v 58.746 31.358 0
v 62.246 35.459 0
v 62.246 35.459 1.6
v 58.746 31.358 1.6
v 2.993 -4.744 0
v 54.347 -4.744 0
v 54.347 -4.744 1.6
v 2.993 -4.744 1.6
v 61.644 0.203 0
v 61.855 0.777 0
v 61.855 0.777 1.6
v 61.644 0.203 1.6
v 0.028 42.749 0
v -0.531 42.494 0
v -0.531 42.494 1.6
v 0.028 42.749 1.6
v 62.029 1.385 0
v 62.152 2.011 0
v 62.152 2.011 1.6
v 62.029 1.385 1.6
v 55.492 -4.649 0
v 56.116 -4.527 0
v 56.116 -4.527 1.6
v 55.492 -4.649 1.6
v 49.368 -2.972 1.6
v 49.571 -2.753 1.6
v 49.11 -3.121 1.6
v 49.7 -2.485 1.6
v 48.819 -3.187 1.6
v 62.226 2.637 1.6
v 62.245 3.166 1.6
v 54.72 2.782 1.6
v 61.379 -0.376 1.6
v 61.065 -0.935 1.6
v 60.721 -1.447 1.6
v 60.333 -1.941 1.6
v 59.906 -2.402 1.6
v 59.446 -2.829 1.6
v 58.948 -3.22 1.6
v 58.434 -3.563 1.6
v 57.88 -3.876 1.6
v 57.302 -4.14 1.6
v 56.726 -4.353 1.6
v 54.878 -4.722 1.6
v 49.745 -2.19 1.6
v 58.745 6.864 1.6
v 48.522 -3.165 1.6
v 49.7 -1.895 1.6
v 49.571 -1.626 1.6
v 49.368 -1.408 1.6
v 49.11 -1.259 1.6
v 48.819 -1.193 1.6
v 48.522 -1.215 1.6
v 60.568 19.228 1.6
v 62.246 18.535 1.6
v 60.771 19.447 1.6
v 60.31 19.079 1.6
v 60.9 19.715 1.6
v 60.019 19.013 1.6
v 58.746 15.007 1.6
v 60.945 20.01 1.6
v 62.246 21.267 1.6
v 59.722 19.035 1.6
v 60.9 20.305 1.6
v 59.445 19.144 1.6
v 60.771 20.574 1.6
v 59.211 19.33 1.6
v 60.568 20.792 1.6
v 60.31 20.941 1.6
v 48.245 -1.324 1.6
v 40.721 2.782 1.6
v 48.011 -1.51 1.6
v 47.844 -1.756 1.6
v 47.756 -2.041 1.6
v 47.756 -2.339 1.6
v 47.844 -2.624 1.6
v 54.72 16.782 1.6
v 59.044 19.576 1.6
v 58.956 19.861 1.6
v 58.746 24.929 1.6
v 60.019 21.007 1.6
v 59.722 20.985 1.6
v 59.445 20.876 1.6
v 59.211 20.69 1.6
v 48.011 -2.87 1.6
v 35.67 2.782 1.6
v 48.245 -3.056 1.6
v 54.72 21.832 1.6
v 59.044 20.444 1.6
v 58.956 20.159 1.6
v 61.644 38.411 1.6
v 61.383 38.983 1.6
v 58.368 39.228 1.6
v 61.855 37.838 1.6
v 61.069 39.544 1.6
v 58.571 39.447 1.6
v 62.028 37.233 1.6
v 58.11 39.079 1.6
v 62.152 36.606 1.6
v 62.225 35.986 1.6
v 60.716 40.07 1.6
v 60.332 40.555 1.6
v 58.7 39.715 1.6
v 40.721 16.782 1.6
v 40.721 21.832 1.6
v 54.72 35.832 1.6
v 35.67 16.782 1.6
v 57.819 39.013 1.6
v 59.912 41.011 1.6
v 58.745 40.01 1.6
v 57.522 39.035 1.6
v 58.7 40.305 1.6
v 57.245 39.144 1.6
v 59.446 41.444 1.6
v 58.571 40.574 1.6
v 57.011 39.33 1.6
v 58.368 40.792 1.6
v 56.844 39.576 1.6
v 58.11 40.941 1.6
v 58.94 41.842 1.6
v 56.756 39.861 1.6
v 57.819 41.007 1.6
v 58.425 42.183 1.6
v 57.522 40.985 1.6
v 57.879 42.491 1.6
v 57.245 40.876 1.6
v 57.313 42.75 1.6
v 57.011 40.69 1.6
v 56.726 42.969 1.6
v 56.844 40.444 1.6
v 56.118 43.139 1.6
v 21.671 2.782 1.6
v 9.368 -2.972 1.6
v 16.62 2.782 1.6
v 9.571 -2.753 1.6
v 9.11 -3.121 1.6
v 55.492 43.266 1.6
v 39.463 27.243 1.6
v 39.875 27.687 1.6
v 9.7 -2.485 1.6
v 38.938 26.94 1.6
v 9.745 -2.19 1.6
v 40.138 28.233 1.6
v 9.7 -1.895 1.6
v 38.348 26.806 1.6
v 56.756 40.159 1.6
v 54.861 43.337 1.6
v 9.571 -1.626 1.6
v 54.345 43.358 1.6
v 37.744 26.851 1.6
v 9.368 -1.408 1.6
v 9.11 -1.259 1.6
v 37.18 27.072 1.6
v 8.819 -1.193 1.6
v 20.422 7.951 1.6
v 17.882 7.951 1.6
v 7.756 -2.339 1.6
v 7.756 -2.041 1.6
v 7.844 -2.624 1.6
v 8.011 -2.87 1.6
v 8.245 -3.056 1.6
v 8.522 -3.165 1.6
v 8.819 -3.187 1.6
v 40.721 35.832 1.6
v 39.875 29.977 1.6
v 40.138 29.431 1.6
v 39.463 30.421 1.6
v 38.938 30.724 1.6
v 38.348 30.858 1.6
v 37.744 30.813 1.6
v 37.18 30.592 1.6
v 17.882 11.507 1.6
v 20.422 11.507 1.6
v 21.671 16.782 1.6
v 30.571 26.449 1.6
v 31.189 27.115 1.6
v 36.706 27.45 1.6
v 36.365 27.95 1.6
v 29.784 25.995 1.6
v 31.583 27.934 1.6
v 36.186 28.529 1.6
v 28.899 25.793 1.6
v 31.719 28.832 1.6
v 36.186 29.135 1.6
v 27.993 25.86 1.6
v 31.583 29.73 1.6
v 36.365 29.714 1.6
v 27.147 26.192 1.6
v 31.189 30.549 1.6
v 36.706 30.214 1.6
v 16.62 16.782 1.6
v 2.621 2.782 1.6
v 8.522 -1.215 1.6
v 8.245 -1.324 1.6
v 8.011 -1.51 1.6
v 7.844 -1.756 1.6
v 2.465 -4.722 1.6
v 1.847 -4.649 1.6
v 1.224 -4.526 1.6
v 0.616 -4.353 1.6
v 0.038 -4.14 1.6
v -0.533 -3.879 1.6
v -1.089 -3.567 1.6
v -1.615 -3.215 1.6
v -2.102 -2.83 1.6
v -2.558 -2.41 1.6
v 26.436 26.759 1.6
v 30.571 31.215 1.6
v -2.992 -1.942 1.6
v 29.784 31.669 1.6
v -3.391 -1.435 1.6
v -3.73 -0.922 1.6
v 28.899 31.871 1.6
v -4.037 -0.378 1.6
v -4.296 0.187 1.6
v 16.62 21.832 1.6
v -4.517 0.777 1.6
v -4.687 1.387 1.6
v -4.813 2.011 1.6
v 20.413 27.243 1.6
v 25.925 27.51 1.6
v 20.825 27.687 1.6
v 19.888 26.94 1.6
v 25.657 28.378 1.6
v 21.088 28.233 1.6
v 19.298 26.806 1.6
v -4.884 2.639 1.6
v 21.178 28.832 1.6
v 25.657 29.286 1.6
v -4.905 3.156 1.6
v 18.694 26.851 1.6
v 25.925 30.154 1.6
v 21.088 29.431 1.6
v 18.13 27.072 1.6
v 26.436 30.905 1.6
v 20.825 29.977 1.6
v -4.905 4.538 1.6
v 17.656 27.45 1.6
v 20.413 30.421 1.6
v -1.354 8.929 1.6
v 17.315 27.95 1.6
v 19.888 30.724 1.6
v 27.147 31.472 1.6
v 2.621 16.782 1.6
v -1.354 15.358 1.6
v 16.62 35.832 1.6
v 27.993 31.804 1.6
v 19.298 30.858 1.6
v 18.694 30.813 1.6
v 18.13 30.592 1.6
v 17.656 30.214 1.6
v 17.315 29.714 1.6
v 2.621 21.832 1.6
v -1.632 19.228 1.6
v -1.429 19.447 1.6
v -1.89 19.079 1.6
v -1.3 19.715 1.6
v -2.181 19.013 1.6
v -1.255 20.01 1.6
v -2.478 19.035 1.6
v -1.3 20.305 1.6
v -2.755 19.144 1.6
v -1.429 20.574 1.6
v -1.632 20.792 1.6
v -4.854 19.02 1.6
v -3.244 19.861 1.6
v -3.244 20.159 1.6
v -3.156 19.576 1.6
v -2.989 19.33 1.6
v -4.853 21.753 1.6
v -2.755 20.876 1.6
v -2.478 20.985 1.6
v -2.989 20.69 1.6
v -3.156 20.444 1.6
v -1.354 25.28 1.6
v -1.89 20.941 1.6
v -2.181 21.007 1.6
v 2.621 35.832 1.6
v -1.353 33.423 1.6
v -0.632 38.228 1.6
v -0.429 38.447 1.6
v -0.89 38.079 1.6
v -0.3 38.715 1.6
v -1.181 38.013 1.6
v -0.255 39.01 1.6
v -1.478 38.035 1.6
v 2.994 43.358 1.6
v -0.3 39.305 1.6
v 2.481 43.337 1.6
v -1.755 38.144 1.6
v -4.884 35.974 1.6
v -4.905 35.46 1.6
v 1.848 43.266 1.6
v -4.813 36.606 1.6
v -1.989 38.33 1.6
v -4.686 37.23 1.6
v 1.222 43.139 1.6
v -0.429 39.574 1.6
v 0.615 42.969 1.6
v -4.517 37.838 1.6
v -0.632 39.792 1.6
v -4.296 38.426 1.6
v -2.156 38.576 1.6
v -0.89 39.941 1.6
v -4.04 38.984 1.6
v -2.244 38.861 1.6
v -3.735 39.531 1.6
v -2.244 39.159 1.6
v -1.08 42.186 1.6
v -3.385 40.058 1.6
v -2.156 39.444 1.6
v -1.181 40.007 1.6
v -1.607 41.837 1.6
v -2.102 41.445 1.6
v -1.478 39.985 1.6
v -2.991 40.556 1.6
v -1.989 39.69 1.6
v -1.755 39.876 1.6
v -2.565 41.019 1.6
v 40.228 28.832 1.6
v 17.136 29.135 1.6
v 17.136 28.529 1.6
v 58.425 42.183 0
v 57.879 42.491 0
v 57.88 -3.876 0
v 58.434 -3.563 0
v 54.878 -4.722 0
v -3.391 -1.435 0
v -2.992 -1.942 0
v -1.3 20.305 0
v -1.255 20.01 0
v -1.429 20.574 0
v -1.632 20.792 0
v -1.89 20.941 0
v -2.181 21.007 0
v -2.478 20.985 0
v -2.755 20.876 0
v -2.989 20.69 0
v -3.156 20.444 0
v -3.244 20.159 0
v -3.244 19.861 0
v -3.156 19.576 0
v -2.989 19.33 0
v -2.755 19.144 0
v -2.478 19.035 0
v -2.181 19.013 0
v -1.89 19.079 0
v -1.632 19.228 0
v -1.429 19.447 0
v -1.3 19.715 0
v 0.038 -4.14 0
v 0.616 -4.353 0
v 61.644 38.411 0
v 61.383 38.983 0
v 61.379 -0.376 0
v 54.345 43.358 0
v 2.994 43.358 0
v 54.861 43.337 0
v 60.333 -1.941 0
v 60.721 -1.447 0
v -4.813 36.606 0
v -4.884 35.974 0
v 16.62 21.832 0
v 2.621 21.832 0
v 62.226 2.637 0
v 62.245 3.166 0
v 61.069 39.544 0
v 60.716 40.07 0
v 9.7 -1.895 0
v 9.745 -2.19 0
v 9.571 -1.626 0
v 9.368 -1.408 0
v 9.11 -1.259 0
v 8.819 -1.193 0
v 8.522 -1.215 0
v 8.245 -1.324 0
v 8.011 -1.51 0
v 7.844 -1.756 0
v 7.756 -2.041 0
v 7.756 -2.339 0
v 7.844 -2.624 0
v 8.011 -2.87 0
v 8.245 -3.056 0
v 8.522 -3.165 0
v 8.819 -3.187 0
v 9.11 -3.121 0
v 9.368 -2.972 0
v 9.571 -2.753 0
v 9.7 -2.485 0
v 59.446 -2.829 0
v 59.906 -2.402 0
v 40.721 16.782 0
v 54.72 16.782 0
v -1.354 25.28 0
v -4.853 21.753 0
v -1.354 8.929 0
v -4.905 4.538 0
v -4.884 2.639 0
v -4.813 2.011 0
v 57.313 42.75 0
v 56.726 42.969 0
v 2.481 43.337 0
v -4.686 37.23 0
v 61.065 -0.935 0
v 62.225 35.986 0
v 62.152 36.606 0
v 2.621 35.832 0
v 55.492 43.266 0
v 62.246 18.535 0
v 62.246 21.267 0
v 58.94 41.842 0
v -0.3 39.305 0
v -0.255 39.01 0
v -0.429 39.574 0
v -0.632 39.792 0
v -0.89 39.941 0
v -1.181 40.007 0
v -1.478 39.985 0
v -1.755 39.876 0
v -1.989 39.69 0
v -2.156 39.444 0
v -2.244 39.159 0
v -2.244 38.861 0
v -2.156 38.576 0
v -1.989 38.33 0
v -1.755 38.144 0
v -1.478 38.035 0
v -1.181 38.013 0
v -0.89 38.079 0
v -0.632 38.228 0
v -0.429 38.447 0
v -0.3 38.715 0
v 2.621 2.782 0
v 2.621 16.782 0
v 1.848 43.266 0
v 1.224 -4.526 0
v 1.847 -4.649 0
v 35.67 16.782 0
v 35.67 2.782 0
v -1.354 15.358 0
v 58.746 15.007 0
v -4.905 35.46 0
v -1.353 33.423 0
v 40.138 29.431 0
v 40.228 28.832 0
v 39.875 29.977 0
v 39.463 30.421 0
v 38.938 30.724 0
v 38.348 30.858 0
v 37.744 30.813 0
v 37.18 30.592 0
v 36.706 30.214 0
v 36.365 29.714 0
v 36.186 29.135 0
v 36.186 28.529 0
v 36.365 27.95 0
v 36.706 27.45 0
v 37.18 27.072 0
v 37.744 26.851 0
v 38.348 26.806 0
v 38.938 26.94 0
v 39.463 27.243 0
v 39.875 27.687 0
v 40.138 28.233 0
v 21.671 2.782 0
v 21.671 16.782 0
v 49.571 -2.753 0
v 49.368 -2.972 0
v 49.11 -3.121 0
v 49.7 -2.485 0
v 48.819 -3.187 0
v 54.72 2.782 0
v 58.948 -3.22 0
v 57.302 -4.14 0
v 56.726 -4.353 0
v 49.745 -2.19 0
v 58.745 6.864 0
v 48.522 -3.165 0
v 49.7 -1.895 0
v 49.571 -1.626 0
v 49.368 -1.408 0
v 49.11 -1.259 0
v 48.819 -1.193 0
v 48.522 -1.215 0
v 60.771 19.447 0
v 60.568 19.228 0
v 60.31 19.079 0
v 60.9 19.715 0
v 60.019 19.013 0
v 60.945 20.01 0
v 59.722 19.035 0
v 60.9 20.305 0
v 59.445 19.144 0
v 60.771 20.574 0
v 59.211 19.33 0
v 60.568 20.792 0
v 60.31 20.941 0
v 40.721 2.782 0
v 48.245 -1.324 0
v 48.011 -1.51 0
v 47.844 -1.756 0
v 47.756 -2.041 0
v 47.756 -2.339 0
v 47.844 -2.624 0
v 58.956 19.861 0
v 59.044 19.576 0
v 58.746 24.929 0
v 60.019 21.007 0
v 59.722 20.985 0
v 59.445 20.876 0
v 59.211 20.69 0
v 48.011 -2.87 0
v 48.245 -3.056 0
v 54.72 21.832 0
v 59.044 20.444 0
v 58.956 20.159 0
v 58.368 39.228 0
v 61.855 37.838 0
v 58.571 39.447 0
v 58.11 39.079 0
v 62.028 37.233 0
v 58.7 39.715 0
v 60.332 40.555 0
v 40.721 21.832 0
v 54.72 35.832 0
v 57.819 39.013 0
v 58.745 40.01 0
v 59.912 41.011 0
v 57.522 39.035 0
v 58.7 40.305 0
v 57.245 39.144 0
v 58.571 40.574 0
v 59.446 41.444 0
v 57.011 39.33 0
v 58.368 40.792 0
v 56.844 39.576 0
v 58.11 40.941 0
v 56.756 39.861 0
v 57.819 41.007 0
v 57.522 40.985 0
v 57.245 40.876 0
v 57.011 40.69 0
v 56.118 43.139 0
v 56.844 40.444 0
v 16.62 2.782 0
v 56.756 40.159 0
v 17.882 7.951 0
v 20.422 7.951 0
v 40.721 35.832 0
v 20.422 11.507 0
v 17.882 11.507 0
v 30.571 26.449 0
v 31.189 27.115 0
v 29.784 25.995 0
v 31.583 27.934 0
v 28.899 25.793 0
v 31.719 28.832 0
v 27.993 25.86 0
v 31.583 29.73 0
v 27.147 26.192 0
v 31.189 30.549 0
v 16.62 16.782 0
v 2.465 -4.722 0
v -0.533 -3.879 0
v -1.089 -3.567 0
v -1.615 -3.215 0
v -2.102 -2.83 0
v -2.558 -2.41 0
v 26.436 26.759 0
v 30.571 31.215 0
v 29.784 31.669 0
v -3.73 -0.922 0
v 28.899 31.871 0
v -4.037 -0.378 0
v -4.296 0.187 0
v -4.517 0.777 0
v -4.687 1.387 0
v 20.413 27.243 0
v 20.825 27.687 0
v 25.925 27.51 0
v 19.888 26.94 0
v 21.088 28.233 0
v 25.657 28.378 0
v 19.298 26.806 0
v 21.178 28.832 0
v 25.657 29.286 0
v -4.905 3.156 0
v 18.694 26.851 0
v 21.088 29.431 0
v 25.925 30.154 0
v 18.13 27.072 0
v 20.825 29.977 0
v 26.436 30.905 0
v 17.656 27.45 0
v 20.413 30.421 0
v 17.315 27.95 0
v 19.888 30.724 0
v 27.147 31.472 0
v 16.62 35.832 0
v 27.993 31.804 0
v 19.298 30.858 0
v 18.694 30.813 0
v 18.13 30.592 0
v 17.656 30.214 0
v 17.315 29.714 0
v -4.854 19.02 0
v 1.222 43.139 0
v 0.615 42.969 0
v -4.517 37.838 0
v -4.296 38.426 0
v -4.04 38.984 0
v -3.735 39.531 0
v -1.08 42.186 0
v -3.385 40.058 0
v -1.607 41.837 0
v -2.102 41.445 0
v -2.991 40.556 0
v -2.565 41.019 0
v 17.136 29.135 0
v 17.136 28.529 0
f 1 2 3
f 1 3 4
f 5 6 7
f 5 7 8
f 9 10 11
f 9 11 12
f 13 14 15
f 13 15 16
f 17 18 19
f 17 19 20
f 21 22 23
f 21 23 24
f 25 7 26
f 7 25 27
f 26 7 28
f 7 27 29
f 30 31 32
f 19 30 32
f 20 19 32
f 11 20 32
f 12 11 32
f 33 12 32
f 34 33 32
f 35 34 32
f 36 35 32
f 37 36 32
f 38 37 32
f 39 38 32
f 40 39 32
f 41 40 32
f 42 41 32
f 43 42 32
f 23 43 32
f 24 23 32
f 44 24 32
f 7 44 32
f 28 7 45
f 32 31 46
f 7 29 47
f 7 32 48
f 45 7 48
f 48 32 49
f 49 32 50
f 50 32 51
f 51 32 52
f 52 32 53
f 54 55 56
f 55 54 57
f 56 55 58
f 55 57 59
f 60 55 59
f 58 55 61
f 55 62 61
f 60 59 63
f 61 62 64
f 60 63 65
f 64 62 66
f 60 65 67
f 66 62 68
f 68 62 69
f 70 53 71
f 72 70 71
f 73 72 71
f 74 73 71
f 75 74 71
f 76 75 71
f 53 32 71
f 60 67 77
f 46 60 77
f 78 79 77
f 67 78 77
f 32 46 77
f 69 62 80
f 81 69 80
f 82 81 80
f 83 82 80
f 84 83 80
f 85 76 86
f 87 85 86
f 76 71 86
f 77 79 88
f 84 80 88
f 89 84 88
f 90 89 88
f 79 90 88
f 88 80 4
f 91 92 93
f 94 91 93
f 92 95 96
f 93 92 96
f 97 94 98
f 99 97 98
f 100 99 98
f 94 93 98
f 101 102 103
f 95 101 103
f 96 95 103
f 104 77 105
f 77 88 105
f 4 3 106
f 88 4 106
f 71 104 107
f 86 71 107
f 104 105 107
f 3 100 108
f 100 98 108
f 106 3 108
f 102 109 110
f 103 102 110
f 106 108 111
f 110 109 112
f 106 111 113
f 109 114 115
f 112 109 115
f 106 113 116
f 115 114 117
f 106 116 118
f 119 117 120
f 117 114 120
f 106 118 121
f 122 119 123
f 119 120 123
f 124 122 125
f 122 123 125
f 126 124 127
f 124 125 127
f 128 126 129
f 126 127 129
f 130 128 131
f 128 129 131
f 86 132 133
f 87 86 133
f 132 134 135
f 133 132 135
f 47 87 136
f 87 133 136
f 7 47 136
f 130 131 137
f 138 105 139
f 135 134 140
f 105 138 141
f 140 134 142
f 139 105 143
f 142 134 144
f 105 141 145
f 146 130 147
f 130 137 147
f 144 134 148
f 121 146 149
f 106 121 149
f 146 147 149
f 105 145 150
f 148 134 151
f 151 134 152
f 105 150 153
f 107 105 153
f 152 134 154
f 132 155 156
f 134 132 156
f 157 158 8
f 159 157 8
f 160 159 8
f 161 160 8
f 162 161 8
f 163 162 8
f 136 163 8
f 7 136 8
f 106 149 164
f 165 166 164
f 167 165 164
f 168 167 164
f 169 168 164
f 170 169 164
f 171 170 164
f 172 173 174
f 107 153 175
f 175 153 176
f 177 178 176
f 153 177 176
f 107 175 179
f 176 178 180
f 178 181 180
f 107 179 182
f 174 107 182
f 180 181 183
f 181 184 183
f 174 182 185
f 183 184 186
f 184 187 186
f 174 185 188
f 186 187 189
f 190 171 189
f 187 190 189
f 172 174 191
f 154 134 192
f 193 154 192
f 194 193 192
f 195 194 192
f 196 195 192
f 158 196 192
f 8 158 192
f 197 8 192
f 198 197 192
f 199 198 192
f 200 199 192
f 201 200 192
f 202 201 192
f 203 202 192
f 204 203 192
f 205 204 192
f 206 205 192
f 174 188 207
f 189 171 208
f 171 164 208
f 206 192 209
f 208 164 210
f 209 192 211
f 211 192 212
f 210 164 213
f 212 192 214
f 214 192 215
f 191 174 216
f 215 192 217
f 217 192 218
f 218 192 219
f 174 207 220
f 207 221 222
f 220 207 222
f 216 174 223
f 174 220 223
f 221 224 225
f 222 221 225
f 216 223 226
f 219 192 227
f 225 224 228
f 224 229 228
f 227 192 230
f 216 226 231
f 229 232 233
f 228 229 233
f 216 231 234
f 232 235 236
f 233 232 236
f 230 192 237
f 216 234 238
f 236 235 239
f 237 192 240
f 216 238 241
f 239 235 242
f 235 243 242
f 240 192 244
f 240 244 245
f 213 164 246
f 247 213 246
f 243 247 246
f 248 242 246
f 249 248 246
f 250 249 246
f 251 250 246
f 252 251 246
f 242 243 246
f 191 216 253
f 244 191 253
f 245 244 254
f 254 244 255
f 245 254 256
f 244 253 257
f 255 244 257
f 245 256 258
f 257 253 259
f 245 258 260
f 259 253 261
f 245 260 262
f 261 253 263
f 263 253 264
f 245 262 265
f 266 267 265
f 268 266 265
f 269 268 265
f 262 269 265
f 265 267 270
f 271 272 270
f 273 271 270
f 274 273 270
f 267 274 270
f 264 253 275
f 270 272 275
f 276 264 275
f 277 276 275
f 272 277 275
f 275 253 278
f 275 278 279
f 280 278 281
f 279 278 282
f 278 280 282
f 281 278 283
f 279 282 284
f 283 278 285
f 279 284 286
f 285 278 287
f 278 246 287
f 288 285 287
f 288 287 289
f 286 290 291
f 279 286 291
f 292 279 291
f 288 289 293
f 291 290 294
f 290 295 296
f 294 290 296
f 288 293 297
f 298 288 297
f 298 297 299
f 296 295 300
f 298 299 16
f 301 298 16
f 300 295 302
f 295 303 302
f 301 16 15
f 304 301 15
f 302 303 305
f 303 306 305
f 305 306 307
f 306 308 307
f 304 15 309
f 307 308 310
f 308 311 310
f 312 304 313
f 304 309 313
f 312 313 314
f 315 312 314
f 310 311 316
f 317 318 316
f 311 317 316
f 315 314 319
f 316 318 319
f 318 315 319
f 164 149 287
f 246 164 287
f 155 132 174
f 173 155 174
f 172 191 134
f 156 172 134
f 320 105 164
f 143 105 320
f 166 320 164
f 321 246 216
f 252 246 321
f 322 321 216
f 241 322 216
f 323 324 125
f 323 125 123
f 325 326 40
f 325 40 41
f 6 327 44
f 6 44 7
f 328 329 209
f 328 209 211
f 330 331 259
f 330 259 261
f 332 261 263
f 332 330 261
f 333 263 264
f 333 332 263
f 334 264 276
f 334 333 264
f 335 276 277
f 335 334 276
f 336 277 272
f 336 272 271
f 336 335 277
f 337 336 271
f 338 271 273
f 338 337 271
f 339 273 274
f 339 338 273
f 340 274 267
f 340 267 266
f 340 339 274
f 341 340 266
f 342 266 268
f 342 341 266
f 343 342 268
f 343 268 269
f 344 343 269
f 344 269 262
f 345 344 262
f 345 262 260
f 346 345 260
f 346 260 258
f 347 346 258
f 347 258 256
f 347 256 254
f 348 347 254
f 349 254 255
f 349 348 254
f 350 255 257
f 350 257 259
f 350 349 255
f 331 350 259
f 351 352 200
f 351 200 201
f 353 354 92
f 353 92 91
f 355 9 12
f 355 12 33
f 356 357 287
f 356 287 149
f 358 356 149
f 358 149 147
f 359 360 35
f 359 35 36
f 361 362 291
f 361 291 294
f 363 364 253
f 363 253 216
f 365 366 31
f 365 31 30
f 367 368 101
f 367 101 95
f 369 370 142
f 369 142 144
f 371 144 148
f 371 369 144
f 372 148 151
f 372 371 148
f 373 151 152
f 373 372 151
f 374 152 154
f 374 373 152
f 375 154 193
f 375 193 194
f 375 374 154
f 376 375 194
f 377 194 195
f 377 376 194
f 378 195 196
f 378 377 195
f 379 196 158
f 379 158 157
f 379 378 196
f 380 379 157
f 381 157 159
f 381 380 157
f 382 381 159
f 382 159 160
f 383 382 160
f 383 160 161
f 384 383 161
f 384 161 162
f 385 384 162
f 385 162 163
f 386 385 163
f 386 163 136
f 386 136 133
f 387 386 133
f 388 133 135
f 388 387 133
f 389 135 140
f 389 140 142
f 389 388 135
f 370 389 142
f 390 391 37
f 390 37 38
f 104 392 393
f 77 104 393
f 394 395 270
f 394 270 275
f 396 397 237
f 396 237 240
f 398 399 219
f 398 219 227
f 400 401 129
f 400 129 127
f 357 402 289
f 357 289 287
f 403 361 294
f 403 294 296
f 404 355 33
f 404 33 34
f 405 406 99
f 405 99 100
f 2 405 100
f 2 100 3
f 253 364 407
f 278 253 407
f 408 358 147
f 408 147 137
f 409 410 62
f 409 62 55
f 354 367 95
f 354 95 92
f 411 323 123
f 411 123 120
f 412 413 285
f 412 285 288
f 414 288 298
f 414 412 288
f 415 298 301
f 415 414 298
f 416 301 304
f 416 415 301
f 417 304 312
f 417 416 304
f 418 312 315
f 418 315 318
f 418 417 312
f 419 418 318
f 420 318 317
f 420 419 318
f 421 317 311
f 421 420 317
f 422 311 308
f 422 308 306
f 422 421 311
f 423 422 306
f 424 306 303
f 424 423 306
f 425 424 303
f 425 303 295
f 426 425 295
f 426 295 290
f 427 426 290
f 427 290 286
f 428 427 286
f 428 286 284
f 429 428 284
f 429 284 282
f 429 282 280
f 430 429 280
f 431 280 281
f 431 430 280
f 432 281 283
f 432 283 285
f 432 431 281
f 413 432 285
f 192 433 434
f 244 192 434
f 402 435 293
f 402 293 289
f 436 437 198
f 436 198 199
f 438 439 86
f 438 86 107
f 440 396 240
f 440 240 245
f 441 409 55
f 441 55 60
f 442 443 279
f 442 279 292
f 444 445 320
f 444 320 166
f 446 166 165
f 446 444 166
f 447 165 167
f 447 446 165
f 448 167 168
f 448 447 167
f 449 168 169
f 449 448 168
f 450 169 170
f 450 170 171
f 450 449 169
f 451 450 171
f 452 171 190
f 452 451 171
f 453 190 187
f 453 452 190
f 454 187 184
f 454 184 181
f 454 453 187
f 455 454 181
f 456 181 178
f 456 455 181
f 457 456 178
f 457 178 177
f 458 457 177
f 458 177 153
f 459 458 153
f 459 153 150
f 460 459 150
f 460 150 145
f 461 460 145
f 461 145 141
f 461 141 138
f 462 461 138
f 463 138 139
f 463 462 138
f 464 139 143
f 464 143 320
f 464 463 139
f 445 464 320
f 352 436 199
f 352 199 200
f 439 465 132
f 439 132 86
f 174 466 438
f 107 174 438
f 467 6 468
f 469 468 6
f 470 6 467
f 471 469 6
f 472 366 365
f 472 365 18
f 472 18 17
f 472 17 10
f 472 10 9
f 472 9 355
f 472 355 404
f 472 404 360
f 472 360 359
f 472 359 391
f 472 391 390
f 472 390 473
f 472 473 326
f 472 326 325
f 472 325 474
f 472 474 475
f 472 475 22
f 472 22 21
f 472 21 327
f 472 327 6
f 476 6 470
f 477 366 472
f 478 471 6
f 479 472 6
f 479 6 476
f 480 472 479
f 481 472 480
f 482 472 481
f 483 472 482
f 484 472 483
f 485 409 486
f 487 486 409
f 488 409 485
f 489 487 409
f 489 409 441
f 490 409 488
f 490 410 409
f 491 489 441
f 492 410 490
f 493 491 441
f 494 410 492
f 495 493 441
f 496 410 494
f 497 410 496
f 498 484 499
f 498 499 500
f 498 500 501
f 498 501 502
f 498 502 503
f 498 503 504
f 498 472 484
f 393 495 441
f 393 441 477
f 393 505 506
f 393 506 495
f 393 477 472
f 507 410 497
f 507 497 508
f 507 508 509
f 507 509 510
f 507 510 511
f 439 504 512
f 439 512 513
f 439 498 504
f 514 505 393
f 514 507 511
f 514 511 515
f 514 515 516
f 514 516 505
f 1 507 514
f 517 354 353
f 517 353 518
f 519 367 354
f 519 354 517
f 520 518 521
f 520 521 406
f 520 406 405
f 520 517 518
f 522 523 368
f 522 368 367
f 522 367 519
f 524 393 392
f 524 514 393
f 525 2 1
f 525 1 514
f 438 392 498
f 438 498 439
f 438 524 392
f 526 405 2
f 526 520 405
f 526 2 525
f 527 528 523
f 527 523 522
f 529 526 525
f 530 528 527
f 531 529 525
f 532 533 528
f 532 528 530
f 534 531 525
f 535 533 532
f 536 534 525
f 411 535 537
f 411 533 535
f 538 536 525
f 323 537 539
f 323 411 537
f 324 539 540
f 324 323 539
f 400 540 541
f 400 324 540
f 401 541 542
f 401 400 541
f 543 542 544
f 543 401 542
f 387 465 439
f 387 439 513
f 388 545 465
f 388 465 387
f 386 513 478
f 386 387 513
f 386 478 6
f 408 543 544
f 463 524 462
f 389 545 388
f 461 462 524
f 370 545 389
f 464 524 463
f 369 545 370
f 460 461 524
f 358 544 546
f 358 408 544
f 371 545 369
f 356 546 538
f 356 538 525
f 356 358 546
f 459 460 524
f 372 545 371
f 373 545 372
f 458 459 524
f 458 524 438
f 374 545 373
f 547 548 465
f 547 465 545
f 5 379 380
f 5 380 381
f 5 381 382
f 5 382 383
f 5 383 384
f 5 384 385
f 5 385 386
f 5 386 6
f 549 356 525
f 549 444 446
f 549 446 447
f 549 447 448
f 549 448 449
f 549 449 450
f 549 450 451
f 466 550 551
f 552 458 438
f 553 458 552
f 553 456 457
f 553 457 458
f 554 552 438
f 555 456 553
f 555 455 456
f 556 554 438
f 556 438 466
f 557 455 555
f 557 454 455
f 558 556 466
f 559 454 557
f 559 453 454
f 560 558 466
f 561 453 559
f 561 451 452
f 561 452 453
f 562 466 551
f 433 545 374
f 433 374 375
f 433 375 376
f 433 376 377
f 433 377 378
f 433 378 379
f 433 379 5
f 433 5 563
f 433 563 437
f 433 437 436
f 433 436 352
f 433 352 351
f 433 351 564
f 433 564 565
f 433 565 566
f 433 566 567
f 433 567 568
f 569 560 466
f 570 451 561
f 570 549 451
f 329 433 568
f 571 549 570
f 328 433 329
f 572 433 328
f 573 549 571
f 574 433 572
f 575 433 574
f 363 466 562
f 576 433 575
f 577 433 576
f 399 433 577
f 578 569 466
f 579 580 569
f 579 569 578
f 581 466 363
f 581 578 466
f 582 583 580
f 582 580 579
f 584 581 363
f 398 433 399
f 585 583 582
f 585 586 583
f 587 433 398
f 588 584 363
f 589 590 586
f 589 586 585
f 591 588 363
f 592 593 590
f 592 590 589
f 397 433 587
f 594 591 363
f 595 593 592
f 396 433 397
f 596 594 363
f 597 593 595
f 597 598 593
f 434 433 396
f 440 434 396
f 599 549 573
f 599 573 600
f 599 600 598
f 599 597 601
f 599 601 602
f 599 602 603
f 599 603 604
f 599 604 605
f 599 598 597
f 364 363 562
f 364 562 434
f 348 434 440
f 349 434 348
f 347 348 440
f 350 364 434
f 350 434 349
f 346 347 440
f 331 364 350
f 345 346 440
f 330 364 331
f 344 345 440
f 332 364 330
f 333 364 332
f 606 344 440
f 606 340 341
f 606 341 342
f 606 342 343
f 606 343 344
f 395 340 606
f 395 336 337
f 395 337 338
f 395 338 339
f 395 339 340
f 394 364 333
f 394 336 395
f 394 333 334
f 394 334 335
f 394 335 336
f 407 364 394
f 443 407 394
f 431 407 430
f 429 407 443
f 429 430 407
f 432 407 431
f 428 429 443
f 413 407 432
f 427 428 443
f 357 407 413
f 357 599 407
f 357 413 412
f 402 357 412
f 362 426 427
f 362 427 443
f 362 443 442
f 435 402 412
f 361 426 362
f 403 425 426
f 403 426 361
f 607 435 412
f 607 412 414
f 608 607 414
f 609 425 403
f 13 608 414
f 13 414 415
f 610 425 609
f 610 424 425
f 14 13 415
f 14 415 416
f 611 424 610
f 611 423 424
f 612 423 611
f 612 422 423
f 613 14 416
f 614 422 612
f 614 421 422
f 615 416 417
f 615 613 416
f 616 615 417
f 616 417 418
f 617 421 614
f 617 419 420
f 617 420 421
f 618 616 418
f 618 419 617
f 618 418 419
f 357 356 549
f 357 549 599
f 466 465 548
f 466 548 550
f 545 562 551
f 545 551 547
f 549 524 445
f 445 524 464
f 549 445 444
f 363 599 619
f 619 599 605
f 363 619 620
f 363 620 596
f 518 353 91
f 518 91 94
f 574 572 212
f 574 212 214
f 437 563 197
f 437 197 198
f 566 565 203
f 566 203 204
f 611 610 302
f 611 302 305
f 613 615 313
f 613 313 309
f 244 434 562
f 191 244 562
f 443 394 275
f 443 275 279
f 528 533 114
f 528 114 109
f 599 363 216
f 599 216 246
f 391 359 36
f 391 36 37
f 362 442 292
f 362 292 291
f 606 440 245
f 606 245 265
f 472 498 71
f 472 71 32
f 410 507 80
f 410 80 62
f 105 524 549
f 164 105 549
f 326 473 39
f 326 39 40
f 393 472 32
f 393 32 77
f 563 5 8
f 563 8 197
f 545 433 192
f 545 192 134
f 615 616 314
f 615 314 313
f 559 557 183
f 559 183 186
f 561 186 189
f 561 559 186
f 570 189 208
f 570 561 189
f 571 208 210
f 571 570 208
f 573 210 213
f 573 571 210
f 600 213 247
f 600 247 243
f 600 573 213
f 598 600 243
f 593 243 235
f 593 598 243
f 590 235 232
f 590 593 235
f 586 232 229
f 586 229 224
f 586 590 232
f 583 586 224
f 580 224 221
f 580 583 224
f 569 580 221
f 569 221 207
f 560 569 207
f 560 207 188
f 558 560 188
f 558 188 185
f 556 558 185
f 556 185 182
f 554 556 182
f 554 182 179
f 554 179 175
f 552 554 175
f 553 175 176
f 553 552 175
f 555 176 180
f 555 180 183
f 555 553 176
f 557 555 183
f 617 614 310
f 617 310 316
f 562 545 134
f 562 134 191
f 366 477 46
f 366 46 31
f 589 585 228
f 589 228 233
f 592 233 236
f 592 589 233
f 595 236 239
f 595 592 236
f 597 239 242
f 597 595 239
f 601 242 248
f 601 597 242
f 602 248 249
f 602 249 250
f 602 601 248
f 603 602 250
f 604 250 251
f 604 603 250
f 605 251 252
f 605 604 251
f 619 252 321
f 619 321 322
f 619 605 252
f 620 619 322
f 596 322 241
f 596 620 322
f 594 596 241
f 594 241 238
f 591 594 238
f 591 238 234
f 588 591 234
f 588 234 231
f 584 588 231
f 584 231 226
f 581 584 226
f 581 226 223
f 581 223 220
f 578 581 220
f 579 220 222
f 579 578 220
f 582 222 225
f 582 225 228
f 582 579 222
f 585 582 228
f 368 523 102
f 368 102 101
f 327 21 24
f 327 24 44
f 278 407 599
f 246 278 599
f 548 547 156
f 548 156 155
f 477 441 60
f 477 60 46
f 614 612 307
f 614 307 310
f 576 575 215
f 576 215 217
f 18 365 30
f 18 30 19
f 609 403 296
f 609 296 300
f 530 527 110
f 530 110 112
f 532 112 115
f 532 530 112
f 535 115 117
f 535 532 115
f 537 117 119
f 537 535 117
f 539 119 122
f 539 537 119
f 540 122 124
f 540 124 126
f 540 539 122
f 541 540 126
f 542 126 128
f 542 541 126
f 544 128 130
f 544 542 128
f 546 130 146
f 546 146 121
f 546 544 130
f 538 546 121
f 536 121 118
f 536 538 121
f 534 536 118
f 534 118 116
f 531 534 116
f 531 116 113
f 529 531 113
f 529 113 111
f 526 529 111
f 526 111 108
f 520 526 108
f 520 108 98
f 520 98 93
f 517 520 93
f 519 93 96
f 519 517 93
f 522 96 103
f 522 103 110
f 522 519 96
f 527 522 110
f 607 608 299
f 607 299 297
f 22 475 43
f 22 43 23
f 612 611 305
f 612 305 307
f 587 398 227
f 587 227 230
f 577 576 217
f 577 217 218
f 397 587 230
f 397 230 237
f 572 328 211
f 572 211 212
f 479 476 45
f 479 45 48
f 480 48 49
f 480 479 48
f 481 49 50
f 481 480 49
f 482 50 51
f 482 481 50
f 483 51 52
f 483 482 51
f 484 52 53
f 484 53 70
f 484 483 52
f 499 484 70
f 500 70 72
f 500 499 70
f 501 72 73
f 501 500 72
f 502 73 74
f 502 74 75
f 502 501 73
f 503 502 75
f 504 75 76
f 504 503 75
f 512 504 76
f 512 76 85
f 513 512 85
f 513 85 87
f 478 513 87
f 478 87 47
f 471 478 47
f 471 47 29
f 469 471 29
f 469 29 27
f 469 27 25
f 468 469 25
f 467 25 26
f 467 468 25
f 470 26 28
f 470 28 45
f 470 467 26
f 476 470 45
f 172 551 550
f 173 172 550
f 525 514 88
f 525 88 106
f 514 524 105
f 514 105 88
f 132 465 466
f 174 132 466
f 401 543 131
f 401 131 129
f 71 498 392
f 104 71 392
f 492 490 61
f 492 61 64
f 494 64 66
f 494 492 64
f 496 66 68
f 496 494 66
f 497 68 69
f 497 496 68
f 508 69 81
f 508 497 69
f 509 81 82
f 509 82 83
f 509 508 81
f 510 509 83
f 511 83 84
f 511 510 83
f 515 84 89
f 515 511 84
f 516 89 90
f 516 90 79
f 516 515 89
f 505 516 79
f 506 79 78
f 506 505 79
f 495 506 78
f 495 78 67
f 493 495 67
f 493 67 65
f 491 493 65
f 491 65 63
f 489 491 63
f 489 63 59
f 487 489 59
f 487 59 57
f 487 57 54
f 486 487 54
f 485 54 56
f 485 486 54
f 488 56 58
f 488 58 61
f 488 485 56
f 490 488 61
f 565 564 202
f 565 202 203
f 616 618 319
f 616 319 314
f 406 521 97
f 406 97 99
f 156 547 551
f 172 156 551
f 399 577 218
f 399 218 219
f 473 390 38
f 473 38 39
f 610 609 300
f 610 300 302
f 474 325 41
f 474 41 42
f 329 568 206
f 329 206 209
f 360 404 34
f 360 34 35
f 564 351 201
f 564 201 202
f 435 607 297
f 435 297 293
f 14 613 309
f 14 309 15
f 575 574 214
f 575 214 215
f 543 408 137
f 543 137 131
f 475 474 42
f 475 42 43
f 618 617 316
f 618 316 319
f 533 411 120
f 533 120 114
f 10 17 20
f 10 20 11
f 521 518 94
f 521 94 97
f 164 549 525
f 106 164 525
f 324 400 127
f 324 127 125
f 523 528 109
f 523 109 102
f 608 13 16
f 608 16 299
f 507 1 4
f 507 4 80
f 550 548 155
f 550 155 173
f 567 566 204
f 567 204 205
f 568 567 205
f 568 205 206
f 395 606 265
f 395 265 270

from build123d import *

# Parameters (mm, degrees)
MODEL_R         = 2.032
MODEL_R_2       = 3.048
MODEL_R_3       = 1
MODEL_W         = 13.99947
MODEL_H         = 13.99944
MODEL_W_2       = 13.9993
MODEL_H_2       = 13.9993
MODEL_W_3       = 13.9994
MODEL_W_4       = 2.54
MODEL_H_3       = 3.556
EXTRUDE_1_DEPTH = 1.6


with BuildPart() as part:
    # Model → 凸台-拉伸1 (new body)
    with BuildSketch(Plane.XY):
        Polygon((-4.883883532, 35.973891408), (-4.813241799, 36.606032798), (-4.68610198, 37.230158431), (-4.516543388, 37.837883816), (-4.295846464, 38.426181173), (-4.040425316, 38.98432755), (-3.734657976, 39.530581217), (-3.38546168, 40.058138925), (-2.991401911, 40.556139441), (-2.564669958, 41.019308228), (-2.102117382, 41.445002794), (-1.607054067, 41.836688867), (-1.079854091, 42.186395311), (-0.531138892, 42.493537781), (0.027842562, 42.749214223), (0.615268756, 42.969285901), (1.221866946, 43.138689477), (1.847538347, 43.266199966), (2.481438717, 43.33682275), (2.994321582, 43.3575), (54.345328535, 43.3575), (54.861412529, 43.336821814), (55.491753218, 43.266152175), (56.117576842, 43.139310654), (56.726490724, 42.969125656), (57.312630049, 42.749556004), (57.878545004, 42.490950339), (58.425461808, 42.18272689), (58.9399975, 41.841630195), (59.445802193, 41.444115049), (59.912079101, 41.011414411), (60.332093164, 40.555391632), (60.716064737, 40.069904287), (61.069053534, 39.543781609), (61.382985177, 38.982666106), (61.644423874, 38.410551538), (61.855071366, 37.838089056), (62.028284371, 37.232642984), (62.152332548, 36.60558626), (62.225027392, 35.986226197), (62.246303139, 35.458587663), (58.746175407, 31.358234918), (58.745975132, 24.929084585), (62.245861062, 21.267199282), (62.245579127, 18.534705638), (58.745666056, 15.007268129), (58.745412398, 6.86443549), (62.245297192, 3.166071528), (62.226202972, 2.636734827), (62.152356641, 2.011350393), (62.029241049, 1.384922025), (61.855333273, 0.776565869), (61.644240363, 0.202684675), (61.379380282, -0.376374826), (61.064717919, -0.934798534), (60.721224007, -1.446690794), (60.332973054, -1.941418241), (59.905767444, -2.401934126), (59.445938304, -2.8287768), (58.947571314, -3.220379587), (58.434482529, -3.563431063), (57.880206411, -3.875955859), (57.302144081, -4.140491025), (56.726168878, -4.352867841), (56.11599848, -4.526806688), (55.492240411, -4.649391053), (54.87843401, -4.722059086), (54.34686609, -4.743685), (2.992774524, -4.743685), (2.464503115, -4.722060038), (1.847223482, -4.64943937), (1.223529929, -4.526191258), (0.615600502, -4.353028424), (0.038326794, -4.140153507), (-0.532800957, -3.878547051), (-1.088890304, -3.567123565), (-1.614610519, -3.215411153), (-2.102251702, -2.829663369), (-2.558331876, -2.409802006), (-2.992281832, -1.942165148), (-3.390574278, -1.434889052), (-3.730362364, -0.921623746), (-4.03681533, -0.378036856), (-4.295659415, 0.187060206), (-4.516803943, 0.776764684), (-4.687062167, 1.387481119), (-4.813264805, 2.011073476), (-4.883883595, 2.639206616), (-4.9049154, 3.15597541), (-4.9049154, 4.538497879), (-1.354024868, 8.929084585), (-1.353649461, 15.358051679), (-4.853710523, 19.020120221), (-4.853428588, 21.752613865), (-1.353515518, 25.280051374), (-1.35326186, 33.422884013), (-4.9049154, 35.460217069), align=None)
        with Locations((38.1958, 28.832)):
            Circle(MODEL_R, mode=Mode.SUBTRACT)
        with Locations((19.1458, 28.832)):
            Circle(MODEL_R, mode=Mode.SUBTRACT)
        with Locations((28.6708, 28.832)):
            Circle(MODEL_R_2, mode=Mode.SUBTRACT)
        with Locations((-2.255498735, 20.010211418)):
            Circle(MODEL_R_3, mode=Mode.SUBTRACT)
        with Locations((-1.255498735, 39.010211418)):
            Circle(MODEL_R_3, mode=Mode.SUBTRACT)
        with Locations((57.744501265, 40.010211418)):
            Circle(MODEL_R_3, mode=Mode.SUBTRACT)
        with Locations((59.944501265, 20.010211418)):
            Circle(MODEL_R_3, mode=Mode.SUBTRACT)
        with Locations((8.744501265, -2.189788582)):
            Circle(MODEL_R_3, mode=Mode.SUBTRACT)
        with Locations((48.744501265, -2.189788582)):
            Circle(MODEL_R_3, mode=Mode.SUBTRACT)
        with Locations((9.620765, 9.78198)):
            Rectangle(MODEL_W, MODEL_H, mode=Mode.SUBTRACT)
        with Locations((47.72075, 28.83195)):
            Rectangle(MODEL_W_2, MODEL_H_2, mode=Mode.SUBTRACT)
        with Locations((28.6707, 9.78198)):
            Rectangle(MODEL_W_3, MODEL_H, mode=Mode.SUBTRACT)
        with Locations((9.620765, 28.83195)):
            Rectangle(MODEL_W, MODEL_H_2, mode=Mode.SUBTRACT)
        with Locations((47.72075, 9.78198)):
            Rectangle(MODEL_W_2, MODEL_H, mode=Mode.SUBTRACT)
        with Locations((19.151523106, 9.728566018)):
            Rectangle(MODEL_W_4, MODEL_H_3, mode=Mode.SUBTRACT)
    extrude(amount=EXTRUDE_1_DEPTH)


solid = part.part
